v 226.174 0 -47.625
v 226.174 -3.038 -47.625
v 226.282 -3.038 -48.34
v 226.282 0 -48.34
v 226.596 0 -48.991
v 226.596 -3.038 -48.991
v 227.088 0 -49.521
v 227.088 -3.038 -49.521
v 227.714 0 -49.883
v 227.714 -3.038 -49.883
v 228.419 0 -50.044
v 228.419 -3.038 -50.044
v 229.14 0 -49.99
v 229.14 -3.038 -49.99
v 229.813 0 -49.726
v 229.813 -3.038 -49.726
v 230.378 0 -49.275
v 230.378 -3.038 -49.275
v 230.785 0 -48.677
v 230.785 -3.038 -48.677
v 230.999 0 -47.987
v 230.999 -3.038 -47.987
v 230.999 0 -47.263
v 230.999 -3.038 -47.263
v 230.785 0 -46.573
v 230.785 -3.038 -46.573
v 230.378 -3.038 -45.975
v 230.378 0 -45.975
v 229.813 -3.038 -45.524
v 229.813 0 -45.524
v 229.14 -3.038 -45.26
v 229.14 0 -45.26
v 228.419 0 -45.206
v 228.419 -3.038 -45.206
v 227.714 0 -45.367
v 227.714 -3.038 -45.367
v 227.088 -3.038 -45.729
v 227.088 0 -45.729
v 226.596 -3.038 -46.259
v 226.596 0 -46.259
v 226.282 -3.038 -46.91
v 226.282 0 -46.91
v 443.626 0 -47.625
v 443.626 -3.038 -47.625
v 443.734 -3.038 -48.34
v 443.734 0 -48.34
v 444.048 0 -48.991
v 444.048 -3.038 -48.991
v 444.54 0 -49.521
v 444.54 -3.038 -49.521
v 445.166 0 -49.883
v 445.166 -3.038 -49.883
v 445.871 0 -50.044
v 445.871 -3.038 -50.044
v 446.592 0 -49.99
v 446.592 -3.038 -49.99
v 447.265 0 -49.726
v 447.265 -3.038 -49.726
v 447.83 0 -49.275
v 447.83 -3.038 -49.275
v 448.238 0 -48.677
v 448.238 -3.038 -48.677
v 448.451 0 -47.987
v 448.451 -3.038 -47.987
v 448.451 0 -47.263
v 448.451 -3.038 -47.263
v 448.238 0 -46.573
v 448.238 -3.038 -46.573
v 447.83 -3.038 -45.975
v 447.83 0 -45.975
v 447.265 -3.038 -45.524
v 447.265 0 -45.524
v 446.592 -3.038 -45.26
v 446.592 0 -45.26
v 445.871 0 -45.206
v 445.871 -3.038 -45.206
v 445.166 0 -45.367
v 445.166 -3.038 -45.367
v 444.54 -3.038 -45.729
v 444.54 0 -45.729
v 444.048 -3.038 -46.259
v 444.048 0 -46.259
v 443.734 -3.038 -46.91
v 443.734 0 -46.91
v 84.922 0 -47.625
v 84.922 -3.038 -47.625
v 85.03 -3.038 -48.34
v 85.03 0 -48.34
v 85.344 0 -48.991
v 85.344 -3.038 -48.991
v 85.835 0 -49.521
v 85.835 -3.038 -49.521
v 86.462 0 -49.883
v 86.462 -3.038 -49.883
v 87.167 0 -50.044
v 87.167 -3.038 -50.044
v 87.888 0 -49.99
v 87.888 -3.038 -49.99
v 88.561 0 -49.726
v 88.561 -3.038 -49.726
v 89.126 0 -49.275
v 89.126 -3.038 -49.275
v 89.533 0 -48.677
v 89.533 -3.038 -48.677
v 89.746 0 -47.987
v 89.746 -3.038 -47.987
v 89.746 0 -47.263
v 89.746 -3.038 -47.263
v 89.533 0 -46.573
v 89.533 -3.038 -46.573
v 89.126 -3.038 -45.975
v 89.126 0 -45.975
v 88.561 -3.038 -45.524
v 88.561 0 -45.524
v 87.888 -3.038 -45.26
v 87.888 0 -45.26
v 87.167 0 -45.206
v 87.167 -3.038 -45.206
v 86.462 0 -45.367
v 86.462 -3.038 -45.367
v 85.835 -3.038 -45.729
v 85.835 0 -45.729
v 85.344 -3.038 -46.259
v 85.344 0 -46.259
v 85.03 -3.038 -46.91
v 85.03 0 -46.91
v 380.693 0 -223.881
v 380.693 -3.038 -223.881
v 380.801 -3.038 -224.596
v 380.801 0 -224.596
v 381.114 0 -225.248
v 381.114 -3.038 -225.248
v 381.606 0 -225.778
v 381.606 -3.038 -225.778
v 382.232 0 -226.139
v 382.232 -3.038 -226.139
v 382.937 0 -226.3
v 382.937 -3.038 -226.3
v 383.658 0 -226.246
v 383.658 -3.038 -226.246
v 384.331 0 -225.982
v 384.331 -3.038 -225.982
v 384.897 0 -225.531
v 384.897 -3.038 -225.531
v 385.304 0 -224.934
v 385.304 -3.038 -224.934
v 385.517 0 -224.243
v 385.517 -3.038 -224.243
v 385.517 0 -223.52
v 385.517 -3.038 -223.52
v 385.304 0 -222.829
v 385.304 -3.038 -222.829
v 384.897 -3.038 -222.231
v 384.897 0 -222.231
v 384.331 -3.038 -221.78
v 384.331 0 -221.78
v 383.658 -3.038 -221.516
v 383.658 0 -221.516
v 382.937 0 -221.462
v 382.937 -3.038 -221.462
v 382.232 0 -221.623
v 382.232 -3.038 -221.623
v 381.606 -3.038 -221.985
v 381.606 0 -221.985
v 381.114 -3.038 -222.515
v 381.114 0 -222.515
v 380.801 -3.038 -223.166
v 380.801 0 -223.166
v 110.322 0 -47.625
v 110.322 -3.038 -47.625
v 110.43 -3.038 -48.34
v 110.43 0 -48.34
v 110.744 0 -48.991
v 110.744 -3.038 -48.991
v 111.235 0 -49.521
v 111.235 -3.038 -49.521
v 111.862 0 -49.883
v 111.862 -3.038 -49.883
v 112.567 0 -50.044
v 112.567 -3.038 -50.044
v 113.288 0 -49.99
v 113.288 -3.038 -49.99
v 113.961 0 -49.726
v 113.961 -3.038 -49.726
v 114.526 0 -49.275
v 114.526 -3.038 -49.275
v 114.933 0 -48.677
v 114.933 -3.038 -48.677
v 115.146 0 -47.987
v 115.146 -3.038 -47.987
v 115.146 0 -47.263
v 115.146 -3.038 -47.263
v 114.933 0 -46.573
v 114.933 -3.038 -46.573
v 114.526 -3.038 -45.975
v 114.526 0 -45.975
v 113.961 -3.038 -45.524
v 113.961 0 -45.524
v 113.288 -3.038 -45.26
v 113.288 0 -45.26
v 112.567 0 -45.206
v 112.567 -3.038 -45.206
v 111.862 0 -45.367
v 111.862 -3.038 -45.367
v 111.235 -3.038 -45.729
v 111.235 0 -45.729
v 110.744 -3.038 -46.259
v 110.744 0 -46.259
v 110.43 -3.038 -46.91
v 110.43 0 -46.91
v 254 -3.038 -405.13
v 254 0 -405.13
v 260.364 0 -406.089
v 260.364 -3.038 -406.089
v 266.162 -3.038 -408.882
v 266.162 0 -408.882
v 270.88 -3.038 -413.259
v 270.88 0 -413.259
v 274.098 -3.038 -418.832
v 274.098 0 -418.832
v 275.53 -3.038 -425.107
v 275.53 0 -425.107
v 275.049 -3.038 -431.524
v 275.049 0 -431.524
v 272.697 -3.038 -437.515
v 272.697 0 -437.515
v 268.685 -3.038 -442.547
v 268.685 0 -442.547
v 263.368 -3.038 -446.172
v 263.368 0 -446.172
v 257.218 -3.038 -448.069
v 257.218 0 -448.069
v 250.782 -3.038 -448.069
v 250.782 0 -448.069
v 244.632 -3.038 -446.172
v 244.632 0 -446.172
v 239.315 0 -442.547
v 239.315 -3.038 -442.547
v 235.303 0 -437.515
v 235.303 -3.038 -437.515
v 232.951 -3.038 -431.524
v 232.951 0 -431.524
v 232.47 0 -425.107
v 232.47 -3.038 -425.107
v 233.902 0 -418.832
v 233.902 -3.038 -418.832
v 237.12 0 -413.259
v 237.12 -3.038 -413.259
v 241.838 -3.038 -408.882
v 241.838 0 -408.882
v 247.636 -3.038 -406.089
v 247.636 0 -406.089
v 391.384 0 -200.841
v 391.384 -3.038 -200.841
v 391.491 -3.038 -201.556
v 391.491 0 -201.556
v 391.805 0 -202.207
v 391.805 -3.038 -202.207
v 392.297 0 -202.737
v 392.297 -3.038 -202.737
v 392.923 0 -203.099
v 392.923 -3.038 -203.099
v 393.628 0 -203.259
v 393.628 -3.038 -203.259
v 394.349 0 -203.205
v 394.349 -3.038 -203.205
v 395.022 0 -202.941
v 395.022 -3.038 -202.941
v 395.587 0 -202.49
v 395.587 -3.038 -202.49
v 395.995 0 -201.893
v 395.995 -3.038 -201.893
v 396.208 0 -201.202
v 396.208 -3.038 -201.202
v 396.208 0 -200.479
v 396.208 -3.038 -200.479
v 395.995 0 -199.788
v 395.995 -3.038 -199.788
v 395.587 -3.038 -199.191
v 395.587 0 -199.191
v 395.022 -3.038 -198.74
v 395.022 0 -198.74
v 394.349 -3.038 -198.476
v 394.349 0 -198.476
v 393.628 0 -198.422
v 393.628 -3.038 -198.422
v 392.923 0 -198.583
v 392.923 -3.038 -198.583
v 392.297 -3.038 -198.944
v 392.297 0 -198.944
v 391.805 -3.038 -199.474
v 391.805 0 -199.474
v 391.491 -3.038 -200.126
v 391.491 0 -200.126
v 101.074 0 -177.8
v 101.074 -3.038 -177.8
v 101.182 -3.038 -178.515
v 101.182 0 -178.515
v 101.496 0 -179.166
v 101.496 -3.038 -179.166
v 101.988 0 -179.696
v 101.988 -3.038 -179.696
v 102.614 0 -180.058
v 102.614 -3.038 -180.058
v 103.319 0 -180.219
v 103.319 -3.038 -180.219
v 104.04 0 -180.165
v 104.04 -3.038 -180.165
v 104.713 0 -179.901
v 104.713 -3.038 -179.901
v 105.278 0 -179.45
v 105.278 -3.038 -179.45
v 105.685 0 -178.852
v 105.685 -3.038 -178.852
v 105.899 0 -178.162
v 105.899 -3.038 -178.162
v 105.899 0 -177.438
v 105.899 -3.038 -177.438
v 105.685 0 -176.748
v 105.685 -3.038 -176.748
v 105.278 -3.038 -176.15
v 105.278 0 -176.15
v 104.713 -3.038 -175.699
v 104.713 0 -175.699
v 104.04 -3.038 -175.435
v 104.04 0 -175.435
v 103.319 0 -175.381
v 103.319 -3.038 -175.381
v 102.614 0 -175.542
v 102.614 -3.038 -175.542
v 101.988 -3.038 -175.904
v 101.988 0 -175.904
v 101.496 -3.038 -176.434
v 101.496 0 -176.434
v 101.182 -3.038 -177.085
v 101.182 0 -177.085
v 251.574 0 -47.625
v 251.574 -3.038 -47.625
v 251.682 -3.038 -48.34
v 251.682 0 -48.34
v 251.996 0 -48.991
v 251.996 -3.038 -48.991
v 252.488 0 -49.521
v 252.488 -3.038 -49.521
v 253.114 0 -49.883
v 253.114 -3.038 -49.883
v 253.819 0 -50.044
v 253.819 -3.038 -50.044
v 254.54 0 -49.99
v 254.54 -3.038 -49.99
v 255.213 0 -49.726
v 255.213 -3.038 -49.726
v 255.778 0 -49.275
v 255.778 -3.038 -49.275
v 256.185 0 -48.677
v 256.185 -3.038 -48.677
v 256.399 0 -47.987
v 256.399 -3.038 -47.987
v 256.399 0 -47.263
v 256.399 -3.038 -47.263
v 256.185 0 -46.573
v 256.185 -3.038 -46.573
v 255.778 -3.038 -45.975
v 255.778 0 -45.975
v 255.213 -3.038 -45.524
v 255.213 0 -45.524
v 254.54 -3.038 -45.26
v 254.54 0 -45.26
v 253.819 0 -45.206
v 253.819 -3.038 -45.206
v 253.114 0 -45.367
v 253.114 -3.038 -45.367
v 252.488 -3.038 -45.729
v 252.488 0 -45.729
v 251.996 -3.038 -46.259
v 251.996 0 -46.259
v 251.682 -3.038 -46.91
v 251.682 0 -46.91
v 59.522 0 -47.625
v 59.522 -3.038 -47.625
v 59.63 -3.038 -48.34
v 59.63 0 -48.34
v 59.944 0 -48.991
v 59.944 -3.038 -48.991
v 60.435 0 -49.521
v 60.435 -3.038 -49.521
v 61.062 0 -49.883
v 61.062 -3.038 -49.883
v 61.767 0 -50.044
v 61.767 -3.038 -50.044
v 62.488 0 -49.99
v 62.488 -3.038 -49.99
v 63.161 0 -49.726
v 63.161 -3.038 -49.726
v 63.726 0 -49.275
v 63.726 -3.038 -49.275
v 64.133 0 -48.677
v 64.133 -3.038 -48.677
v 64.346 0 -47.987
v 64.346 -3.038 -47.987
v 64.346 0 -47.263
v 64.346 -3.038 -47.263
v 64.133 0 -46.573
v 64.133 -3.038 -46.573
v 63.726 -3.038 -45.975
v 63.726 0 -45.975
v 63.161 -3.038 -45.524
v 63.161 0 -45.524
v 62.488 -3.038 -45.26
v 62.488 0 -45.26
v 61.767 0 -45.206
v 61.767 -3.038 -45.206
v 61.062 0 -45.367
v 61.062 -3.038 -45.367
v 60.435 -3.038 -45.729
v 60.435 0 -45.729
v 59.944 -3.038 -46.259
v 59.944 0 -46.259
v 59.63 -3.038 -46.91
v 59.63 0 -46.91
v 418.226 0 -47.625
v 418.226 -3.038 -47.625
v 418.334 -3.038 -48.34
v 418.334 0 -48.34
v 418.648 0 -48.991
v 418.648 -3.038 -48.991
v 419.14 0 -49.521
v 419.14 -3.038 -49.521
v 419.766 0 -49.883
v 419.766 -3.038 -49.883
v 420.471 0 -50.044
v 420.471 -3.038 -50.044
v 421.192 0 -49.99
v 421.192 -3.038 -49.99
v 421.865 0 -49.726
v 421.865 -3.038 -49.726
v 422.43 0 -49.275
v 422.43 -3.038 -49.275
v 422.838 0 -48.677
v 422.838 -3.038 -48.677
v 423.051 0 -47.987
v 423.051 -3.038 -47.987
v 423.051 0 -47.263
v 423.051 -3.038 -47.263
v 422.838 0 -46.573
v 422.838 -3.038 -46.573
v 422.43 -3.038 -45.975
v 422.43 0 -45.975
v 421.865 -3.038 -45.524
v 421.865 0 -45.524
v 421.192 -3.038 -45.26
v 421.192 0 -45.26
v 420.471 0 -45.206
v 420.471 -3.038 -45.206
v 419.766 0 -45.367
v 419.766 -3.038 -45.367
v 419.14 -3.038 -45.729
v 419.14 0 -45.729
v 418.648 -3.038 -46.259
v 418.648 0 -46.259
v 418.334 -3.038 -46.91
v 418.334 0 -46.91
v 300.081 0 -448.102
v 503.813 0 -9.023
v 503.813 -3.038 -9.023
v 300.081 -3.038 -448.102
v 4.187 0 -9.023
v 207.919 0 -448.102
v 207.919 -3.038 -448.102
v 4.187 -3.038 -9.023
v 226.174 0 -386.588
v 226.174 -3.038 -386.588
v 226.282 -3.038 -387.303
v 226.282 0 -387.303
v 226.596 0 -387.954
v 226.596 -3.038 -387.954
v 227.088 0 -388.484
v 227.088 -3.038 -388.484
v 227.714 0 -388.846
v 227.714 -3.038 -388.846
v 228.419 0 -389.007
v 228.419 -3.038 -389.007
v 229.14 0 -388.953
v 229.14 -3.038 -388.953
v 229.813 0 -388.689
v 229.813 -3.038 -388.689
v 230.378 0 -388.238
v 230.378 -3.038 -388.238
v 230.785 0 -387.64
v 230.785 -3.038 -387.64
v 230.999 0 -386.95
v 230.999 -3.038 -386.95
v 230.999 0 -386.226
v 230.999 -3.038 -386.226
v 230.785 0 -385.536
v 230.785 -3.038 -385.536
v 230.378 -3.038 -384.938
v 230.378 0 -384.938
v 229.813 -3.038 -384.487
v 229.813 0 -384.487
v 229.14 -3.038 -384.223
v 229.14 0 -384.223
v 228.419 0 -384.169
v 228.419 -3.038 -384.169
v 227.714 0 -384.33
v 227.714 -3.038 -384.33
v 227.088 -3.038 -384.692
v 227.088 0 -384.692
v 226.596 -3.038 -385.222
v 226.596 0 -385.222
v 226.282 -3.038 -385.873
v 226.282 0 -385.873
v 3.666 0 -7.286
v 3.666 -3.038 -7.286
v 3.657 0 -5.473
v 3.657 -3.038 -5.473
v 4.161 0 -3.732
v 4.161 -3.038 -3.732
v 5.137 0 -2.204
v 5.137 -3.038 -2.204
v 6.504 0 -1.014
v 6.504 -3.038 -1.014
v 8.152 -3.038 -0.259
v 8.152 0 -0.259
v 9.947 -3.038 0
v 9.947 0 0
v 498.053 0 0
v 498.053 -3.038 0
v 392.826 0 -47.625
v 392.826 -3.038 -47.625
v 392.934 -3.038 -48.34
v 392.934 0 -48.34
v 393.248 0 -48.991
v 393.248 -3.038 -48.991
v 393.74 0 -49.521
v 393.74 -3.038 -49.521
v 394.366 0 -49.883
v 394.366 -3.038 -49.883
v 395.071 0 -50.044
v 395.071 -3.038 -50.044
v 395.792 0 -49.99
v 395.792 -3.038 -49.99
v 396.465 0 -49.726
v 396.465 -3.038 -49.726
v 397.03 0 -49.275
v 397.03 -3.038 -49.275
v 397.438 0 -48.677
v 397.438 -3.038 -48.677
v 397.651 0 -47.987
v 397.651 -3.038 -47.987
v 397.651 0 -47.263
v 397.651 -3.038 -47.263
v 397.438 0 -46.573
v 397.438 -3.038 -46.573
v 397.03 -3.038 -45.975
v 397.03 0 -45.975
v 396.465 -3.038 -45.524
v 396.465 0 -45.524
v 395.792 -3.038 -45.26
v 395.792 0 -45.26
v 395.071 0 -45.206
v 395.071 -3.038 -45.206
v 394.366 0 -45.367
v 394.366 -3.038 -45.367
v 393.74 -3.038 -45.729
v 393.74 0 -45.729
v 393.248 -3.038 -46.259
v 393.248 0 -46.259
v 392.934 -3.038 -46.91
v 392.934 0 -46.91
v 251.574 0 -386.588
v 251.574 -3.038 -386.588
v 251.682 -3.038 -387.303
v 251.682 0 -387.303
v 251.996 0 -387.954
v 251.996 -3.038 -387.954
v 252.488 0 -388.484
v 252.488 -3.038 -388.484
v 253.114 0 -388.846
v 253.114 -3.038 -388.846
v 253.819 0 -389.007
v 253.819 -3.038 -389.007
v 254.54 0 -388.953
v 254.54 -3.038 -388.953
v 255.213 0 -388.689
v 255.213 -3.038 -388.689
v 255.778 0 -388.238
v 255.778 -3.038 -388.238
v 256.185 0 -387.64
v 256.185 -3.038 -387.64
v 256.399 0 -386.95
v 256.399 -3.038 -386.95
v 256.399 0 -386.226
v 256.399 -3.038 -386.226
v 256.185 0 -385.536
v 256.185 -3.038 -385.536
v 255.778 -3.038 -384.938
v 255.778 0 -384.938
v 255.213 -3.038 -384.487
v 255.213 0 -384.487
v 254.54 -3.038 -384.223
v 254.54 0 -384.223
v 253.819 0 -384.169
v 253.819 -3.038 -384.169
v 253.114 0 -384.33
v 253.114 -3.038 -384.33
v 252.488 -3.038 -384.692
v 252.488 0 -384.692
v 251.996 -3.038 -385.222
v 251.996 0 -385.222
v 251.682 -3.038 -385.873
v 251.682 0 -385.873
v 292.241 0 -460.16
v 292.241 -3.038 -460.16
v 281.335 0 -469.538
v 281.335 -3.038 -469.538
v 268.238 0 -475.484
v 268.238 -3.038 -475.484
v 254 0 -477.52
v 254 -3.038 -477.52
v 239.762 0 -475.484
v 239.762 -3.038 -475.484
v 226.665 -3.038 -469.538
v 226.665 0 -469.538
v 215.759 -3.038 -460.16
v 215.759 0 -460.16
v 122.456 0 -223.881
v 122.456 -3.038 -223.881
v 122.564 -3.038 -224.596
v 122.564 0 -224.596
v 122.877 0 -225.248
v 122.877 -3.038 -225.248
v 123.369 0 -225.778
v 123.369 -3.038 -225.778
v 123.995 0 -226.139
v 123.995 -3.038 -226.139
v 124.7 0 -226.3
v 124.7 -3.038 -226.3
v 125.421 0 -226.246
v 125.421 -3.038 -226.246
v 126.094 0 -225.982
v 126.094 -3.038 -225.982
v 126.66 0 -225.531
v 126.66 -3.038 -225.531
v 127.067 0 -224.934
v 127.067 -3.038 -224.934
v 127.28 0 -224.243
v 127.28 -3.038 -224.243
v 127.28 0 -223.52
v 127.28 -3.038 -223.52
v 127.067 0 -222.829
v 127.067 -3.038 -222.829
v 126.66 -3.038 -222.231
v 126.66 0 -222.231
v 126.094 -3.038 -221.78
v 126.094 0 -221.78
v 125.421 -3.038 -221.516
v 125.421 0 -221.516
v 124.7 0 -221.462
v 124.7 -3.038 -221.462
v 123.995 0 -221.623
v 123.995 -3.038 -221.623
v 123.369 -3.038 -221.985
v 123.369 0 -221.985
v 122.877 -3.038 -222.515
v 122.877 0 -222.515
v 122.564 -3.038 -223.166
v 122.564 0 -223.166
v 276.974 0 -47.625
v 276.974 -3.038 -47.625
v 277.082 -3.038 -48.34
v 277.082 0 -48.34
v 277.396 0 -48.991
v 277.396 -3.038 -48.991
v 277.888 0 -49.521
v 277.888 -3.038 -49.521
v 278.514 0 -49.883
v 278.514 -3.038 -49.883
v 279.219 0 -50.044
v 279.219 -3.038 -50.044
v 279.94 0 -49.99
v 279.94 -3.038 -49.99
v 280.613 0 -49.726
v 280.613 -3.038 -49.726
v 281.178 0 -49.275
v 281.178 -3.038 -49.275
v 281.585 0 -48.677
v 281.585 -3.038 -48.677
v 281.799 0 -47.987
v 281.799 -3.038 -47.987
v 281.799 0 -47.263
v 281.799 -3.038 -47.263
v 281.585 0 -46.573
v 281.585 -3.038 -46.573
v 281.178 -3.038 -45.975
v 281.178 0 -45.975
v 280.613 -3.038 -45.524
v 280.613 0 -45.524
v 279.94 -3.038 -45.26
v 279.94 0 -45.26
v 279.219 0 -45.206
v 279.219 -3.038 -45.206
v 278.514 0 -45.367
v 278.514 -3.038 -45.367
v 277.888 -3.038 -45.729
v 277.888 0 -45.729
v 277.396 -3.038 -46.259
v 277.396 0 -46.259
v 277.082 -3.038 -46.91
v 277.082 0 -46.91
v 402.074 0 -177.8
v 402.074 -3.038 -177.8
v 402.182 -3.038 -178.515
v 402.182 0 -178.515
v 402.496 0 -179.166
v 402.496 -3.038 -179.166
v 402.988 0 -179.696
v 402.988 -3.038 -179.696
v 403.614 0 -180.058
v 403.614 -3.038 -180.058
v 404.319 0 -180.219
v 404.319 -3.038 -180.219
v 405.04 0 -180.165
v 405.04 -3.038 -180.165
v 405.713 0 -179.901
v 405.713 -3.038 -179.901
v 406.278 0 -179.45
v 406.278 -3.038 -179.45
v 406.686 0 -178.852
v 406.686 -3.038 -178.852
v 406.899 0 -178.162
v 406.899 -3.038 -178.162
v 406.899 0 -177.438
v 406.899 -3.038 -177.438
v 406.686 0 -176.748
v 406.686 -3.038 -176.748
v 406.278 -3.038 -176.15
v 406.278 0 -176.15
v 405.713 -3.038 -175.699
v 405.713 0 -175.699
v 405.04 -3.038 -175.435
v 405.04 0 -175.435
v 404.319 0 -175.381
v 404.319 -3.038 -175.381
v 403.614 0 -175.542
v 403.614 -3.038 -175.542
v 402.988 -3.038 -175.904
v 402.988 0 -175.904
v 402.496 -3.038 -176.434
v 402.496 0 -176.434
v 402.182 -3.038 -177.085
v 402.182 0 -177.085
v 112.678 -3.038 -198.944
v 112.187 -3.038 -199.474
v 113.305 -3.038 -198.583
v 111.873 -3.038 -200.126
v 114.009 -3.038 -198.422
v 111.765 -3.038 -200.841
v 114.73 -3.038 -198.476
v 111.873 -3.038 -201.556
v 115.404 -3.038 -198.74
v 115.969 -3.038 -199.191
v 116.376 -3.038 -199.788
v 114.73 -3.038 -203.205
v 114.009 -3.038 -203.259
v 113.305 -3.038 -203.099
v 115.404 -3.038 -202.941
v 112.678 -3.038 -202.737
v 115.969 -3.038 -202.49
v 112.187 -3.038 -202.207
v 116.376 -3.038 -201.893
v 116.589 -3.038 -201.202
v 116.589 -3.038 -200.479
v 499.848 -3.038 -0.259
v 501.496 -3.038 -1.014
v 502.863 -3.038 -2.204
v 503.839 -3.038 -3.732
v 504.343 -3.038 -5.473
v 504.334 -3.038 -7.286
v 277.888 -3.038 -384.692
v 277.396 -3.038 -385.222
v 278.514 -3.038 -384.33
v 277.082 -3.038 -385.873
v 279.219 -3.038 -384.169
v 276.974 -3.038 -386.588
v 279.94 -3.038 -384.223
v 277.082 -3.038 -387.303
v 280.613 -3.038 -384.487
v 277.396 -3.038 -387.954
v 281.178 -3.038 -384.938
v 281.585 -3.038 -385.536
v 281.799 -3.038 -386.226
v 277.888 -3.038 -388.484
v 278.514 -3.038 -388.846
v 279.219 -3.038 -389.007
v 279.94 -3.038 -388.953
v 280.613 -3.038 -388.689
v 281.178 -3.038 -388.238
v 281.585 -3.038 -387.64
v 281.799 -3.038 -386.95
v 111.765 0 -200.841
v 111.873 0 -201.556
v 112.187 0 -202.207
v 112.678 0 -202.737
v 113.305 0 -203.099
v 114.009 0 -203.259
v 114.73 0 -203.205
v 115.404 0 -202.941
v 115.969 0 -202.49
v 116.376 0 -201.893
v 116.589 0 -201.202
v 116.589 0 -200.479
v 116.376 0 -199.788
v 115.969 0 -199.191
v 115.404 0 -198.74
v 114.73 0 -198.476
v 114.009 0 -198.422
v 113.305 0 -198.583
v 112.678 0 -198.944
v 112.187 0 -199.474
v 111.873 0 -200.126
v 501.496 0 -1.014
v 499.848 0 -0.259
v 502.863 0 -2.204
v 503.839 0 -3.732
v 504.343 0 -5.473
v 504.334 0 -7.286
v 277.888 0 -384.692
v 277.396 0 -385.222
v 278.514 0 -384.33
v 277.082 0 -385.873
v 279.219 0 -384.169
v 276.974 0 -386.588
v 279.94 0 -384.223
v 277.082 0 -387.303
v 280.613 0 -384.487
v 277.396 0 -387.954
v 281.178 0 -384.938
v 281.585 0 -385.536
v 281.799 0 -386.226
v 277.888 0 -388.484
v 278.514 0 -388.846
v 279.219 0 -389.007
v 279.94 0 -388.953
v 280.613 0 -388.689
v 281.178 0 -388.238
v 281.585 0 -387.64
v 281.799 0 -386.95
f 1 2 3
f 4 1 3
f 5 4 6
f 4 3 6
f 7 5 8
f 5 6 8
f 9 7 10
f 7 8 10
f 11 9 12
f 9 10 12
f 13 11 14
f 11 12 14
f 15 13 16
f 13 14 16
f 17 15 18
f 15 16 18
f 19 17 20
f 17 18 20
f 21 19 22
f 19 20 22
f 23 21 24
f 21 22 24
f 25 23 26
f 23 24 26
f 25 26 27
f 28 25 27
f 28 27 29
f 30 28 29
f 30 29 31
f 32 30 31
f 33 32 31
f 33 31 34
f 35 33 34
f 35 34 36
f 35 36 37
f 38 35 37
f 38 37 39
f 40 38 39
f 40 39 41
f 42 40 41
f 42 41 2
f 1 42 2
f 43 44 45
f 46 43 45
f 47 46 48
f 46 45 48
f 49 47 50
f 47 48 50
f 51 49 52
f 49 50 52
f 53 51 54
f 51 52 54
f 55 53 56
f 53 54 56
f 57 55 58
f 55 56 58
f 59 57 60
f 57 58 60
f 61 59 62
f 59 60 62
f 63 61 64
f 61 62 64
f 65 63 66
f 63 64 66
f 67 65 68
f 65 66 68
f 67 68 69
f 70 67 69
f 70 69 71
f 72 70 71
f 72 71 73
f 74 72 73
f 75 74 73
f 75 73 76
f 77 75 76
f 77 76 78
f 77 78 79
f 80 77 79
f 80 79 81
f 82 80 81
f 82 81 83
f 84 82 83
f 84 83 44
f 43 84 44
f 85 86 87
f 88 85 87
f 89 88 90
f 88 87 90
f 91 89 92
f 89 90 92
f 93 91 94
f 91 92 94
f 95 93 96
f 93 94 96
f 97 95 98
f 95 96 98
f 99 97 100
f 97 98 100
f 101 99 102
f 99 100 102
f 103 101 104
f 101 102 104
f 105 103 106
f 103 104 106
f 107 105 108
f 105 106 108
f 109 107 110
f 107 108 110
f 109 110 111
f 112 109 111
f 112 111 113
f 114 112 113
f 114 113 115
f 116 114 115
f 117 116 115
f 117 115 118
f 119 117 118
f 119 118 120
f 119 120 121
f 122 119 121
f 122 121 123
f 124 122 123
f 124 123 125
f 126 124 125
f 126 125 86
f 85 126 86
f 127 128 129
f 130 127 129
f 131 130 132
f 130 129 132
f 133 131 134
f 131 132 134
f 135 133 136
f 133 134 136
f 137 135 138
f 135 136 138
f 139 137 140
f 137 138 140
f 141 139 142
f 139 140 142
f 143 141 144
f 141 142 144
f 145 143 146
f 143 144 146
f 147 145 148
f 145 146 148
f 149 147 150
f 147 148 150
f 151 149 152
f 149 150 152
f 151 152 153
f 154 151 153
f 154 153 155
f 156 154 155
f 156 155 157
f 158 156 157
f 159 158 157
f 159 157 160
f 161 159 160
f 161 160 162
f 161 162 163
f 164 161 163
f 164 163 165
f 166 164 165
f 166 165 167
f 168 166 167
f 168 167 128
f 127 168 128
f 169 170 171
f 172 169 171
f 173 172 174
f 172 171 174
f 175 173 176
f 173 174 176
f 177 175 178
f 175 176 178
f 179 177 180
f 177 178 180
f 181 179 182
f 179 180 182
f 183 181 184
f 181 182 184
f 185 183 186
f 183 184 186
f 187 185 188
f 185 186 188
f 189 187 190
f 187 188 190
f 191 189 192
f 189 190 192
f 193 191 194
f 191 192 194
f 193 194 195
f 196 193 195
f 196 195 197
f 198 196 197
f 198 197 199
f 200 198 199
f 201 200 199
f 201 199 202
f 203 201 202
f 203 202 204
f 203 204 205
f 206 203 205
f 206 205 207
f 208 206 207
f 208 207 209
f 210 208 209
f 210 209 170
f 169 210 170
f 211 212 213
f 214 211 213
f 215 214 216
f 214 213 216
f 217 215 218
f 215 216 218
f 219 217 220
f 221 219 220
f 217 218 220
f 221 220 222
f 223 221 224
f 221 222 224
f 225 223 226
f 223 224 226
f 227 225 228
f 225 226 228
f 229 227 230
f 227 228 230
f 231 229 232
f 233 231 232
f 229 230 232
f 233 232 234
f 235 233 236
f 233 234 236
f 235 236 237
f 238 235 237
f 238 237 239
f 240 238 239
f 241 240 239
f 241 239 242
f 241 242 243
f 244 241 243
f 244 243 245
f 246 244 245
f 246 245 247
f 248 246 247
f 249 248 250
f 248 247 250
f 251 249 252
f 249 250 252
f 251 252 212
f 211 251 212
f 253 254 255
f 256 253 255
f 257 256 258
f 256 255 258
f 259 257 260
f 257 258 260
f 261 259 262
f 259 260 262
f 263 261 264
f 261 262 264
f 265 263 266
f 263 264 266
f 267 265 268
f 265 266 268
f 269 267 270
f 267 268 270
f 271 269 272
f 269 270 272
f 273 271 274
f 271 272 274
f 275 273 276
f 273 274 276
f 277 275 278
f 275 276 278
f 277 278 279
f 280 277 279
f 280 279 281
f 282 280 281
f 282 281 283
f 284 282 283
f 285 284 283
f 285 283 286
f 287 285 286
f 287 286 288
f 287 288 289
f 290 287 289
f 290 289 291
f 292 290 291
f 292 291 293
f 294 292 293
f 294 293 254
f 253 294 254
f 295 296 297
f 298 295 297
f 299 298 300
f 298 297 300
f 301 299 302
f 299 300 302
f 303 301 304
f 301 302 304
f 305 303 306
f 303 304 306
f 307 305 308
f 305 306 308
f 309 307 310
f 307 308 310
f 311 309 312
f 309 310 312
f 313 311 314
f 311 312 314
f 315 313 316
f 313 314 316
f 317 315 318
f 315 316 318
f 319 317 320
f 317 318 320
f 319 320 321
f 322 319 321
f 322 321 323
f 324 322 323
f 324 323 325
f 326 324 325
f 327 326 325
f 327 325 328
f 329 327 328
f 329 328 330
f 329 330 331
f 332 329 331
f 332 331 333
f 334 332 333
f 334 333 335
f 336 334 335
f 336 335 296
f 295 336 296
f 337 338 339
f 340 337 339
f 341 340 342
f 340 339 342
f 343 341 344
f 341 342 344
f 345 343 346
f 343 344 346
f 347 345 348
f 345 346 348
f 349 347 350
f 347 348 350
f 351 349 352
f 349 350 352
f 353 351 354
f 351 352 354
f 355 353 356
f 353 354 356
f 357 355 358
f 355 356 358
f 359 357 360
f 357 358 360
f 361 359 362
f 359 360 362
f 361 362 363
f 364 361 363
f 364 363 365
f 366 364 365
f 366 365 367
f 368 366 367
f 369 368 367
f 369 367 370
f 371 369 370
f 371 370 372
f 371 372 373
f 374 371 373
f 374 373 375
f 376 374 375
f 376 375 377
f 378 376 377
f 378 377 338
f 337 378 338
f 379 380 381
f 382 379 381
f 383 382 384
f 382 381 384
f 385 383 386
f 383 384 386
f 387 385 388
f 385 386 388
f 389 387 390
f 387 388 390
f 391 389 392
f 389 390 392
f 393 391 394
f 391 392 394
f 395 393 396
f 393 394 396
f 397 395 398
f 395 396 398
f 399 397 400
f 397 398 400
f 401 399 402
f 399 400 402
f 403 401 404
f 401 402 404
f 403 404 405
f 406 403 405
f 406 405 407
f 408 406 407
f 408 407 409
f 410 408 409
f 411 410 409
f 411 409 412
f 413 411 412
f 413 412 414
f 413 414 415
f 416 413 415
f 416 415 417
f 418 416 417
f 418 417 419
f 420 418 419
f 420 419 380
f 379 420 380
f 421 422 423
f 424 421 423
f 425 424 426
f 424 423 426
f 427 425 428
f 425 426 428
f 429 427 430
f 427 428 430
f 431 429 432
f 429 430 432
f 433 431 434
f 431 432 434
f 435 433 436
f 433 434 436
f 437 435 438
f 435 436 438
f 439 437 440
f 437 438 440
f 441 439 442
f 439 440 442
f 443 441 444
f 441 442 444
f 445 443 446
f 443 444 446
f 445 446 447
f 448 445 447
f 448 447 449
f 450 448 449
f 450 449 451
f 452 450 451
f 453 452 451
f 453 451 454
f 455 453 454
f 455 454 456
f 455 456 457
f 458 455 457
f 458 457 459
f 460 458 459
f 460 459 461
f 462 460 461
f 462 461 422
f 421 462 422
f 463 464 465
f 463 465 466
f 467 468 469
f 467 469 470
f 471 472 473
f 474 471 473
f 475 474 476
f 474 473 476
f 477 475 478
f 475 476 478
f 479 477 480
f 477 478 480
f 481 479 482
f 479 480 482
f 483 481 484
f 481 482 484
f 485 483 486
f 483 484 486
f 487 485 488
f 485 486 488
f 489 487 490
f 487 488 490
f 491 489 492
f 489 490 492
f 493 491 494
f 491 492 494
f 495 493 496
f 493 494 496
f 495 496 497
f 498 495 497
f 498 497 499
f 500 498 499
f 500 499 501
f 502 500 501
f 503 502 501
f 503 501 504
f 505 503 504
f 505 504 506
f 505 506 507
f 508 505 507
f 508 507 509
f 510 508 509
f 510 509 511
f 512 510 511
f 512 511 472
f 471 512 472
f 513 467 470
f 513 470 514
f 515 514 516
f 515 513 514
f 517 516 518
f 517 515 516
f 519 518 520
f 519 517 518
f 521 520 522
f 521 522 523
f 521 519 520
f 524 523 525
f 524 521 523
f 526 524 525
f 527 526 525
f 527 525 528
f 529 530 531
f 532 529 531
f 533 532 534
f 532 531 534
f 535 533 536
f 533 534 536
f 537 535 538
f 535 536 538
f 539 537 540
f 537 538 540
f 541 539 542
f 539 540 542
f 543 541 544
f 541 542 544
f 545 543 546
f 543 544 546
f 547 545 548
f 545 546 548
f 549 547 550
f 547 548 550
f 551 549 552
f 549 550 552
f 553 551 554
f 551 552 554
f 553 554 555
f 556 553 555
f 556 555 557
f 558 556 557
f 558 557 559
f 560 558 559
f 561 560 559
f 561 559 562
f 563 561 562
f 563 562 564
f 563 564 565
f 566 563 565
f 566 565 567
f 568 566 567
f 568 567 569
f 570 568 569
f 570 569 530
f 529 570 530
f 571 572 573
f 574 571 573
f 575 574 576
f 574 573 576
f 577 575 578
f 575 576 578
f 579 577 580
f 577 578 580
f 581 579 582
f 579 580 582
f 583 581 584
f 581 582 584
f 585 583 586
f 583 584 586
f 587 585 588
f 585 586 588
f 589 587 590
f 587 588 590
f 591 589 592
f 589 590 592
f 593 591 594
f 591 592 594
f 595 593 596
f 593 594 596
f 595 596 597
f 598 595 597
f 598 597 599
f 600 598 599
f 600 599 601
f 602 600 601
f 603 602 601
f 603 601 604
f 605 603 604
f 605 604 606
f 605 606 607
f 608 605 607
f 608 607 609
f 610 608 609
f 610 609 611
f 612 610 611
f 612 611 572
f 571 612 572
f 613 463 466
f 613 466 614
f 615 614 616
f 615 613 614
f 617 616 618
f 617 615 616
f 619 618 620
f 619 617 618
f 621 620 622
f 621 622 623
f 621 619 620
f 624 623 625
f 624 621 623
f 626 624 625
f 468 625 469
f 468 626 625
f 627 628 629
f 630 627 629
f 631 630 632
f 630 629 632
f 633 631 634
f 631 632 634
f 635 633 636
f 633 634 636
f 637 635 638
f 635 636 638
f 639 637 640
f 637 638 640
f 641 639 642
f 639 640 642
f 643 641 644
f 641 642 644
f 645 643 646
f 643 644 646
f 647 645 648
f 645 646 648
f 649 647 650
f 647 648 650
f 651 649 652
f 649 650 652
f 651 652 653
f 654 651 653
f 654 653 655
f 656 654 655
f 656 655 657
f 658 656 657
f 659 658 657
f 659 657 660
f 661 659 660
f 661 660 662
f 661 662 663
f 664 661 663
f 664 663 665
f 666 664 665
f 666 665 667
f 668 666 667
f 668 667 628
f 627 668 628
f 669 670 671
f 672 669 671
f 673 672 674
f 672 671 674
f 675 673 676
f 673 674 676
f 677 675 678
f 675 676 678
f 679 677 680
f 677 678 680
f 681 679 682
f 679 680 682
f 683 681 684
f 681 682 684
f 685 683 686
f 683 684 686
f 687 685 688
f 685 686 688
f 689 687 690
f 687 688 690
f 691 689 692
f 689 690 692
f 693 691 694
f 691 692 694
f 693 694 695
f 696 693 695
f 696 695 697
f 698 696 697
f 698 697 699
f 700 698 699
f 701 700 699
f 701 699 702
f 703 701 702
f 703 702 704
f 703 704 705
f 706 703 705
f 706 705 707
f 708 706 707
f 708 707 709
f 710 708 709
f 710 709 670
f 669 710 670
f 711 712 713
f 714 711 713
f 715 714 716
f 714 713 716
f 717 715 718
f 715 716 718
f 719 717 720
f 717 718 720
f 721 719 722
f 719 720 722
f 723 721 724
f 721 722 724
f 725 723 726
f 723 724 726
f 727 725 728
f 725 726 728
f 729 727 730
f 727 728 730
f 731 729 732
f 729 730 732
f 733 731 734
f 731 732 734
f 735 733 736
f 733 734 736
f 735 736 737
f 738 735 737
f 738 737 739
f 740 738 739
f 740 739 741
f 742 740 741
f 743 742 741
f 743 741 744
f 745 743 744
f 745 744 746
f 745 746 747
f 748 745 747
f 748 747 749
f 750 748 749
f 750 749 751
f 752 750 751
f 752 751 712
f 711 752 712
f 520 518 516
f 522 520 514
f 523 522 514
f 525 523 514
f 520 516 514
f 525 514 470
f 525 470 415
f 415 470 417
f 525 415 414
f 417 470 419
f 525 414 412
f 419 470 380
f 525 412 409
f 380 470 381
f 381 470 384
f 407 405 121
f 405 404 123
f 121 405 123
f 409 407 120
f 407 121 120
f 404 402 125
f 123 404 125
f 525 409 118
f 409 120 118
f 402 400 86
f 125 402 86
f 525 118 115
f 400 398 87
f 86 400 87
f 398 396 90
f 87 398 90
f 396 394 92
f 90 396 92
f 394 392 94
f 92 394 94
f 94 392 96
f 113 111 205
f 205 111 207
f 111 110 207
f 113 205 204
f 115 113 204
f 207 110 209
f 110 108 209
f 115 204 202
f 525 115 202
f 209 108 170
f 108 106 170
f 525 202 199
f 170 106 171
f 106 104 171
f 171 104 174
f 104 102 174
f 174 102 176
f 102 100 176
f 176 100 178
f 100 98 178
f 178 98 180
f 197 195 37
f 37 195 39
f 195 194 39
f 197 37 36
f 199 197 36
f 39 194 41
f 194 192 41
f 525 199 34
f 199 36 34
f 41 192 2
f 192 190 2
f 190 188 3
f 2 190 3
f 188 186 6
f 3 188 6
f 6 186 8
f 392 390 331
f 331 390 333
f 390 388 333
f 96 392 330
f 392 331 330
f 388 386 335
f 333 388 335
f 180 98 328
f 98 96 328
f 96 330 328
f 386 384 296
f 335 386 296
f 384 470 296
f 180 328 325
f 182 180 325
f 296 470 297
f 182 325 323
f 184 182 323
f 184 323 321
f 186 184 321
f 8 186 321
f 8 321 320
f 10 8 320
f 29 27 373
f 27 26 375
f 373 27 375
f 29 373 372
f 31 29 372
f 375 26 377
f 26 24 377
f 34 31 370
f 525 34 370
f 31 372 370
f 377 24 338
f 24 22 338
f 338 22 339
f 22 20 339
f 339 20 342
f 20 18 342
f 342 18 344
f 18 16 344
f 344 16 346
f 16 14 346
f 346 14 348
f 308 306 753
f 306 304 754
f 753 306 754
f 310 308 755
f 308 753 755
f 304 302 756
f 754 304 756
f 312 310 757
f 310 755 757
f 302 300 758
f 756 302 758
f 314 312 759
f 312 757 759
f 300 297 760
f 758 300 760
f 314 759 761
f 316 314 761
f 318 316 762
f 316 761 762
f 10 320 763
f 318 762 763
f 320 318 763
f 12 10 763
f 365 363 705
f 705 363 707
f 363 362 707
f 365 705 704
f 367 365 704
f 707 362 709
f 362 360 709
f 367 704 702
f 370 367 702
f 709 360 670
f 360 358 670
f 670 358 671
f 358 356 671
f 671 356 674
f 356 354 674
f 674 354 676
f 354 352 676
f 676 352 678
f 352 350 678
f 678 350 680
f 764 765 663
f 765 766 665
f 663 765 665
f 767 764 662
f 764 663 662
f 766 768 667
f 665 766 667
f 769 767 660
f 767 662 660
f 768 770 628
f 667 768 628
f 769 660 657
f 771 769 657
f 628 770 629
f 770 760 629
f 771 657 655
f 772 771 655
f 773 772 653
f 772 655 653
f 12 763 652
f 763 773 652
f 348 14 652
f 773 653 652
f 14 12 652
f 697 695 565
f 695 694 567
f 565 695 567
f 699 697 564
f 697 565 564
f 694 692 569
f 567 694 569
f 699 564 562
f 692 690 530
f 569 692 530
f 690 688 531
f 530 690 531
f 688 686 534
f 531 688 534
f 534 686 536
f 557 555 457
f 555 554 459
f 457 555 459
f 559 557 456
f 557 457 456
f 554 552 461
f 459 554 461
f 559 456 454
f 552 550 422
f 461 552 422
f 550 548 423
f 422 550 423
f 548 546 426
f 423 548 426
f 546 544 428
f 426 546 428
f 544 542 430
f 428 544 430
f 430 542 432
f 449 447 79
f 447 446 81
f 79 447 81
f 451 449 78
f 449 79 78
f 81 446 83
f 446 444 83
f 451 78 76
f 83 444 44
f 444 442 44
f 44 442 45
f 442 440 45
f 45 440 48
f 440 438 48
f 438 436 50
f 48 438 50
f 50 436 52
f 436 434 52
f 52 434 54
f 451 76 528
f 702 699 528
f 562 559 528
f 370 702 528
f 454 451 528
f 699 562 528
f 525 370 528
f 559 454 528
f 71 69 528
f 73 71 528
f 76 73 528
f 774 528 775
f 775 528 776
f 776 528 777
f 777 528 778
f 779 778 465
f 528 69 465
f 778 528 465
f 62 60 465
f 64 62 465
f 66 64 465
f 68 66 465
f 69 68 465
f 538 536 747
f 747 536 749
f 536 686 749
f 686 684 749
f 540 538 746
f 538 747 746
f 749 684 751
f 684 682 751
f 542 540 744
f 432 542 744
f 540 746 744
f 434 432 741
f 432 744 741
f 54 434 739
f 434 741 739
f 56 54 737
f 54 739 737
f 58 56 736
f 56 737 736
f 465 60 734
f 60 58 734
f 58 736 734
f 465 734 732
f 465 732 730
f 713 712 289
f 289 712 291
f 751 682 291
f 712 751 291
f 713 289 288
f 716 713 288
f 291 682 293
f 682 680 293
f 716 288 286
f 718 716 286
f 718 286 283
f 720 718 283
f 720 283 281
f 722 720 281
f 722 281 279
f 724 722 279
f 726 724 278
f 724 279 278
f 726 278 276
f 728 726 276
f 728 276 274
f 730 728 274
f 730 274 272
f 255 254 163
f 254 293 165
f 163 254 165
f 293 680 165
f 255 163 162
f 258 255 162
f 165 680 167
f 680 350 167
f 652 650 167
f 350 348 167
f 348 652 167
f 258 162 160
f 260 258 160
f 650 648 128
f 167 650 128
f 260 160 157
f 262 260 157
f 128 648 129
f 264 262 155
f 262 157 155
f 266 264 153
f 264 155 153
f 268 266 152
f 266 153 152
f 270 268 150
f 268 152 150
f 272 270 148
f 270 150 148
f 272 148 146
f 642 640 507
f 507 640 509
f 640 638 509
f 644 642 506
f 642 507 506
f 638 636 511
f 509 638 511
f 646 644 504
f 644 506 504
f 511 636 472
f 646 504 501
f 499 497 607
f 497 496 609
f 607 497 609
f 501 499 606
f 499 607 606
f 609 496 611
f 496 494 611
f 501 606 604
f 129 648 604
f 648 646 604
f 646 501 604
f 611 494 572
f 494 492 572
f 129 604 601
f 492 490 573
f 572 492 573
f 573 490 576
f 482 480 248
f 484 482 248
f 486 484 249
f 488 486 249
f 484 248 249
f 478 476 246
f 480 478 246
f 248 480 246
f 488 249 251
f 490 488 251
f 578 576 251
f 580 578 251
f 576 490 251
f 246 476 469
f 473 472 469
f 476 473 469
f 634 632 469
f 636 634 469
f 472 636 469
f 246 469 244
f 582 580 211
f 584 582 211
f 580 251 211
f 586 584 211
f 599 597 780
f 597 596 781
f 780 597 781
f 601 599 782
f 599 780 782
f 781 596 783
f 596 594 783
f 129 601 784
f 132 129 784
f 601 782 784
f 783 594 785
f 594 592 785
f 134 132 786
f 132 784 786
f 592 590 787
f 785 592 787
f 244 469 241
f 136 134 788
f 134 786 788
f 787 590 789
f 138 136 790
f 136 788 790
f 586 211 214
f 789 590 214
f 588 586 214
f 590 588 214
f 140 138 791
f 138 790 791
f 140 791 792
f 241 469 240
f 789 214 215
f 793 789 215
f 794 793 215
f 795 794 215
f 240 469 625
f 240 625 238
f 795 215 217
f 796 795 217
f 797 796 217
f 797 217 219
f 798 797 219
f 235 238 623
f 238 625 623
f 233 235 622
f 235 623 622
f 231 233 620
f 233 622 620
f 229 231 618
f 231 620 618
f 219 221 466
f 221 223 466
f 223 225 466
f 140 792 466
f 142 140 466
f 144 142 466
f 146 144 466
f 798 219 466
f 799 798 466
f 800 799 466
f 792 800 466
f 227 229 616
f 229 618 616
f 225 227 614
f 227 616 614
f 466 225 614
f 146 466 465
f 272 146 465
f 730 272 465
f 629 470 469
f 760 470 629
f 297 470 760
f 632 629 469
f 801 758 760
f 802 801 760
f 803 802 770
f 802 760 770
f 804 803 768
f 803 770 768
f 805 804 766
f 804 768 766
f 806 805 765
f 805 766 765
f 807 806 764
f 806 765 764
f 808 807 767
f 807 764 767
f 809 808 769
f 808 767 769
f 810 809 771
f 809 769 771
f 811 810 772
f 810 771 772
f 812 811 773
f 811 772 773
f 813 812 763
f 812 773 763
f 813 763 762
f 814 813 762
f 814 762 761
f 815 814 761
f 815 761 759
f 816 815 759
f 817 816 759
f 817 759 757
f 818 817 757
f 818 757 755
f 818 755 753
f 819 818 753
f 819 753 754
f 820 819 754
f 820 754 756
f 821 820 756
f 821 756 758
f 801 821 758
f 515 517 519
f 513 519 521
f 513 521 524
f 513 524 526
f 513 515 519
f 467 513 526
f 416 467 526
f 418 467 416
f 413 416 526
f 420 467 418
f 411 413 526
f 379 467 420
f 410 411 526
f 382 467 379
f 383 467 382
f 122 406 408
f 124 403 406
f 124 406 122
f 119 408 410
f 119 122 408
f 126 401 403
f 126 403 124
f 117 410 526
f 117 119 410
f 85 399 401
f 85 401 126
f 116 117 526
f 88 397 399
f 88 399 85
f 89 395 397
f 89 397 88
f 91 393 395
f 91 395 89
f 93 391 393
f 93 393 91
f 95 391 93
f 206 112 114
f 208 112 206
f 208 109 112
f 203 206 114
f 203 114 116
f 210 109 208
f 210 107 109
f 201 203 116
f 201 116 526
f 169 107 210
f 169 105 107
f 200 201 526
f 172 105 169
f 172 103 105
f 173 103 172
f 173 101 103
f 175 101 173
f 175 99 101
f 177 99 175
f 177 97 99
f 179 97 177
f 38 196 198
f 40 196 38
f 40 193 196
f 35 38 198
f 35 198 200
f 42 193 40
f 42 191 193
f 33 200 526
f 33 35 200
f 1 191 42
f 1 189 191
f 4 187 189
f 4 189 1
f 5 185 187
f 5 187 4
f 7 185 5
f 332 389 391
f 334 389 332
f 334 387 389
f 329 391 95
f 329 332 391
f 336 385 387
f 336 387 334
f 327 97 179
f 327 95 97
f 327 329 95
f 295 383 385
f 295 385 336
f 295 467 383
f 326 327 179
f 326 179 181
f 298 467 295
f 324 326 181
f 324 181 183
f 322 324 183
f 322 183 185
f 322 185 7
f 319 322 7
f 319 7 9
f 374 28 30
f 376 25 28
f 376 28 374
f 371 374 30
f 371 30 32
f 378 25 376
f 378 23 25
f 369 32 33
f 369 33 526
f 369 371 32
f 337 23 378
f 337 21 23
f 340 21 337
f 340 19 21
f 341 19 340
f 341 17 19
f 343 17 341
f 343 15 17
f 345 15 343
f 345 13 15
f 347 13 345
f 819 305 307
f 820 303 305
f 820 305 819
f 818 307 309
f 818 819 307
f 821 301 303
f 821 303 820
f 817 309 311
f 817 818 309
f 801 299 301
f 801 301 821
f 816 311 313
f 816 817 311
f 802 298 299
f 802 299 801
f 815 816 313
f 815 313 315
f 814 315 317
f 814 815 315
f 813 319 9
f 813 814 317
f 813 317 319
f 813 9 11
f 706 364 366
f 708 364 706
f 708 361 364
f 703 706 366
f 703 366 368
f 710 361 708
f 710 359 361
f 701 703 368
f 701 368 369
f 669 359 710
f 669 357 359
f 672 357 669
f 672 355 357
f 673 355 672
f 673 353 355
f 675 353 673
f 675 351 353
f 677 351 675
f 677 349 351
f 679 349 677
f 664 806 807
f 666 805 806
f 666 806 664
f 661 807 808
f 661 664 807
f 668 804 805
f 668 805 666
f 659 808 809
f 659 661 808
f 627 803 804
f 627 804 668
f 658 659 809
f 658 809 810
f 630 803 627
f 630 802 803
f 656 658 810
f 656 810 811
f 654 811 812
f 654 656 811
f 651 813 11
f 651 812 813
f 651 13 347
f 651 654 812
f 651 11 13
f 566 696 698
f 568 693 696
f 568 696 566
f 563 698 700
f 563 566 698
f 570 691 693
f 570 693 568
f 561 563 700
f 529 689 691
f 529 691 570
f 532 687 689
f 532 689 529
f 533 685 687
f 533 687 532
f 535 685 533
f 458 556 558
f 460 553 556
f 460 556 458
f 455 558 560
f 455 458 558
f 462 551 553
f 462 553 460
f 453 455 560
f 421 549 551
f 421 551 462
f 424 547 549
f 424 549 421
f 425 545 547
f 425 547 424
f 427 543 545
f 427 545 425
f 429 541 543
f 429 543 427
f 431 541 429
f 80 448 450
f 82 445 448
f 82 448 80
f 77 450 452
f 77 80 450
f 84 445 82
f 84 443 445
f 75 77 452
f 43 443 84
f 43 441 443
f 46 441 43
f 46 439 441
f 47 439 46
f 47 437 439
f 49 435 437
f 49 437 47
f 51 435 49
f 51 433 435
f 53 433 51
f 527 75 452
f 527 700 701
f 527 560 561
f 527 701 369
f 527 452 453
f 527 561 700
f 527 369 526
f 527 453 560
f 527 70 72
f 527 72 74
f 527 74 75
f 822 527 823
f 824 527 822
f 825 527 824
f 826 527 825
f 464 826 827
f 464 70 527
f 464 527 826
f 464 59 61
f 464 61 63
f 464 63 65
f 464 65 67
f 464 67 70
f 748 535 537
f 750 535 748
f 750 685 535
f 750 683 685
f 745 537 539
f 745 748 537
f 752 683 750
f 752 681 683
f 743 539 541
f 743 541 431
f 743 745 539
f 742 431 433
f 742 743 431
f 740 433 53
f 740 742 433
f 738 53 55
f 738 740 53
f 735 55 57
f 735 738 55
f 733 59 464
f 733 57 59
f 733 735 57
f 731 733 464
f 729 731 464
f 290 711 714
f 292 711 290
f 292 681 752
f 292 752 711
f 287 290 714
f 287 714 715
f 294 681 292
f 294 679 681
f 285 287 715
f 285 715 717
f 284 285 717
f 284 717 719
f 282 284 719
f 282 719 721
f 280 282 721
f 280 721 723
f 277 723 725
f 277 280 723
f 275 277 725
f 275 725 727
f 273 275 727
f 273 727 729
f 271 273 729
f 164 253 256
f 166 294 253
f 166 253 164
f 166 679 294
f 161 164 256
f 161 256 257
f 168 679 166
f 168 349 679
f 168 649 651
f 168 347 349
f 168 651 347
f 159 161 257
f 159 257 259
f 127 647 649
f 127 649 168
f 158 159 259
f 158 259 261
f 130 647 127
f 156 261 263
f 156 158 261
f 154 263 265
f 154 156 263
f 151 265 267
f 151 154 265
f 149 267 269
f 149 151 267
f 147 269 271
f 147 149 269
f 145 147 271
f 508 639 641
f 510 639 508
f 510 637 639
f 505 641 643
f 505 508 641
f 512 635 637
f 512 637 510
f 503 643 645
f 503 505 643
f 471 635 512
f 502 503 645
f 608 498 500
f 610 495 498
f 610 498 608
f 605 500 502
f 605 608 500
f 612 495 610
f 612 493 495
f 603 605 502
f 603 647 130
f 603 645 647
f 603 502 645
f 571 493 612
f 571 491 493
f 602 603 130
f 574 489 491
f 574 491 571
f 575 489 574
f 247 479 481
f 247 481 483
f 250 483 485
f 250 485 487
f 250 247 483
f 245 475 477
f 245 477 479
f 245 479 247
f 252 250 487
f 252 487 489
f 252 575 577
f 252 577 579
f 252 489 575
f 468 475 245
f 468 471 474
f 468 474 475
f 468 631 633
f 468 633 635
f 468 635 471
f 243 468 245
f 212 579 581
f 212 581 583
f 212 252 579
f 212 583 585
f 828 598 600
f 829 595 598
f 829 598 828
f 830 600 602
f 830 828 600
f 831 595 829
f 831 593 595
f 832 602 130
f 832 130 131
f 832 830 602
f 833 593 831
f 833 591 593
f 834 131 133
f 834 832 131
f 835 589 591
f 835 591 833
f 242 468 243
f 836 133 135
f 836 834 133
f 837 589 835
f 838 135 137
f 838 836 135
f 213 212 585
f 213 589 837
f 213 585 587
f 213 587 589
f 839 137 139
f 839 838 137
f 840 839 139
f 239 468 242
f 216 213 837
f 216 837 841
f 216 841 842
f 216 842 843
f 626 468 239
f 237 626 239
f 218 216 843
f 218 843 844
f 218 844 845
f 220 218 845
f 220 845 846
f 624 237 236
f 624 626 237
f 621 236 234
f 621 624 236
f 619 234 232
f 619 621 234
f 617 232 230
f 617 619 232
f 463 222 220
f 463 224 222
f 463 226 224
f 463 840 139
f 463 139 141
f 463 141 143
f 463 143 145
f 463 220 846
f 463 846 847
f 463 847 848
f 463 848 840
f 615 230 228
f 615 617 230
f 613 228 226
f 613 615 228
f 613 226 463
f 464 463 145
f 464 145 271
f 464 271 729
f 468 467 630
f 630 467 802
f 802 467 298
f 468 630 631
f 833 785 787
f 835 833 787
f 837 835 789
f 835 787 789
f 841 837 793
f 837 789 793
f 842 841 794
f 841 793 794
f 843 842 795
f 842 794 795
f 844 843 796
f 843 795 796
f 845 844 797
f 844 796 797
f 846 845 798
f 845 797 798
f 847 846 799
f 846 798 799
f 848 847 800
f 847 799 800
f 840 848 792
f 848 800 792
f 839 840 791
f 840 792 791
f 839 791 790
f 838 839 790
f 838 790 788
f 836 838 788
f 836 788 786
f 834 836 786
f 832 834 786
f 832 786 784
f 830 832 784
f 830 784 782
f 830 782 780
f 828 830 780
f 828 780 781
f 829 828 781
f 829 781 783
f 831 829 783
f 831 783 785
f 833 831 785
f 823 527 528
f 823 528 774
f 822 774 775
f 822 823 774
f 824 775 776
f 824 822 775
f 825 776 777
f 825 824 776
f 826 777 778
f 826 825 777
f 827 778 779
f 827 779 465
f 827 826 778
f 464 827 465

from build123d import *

# Parameters (mm, degrees)
SKETCH1_R                   = 21.59
BASE_FLANGE1_DEPTH          = 3.03784
F_11_0_191_DIAMETER_HOLE1_D = 4.8514
F_11_0_191_DIAMETER_HOLE2_D = 4.8514


# Sheet-metal steps are written as plain solids
with BuildPart() as part:
    # Sketch1 → Base-Flange1 (new body)
    with BuildSketch(Plane(origin=(0, 0, 0), x_dir=(1, 0, 0), z_dir=(0, 1, 0))):
        with BuildLine():
            Line((9.946664741, 0), (498.053335259, 0))
            ThreePointArc((498.053335259, 0), (503.405631357, 2.933067681), (503.813471801, 9.022700323))
            Line((503.813471801, 9.022700323), (300.081092338, 448.101602582))
            ThreePointArc((300.081092338, 448.101602582), (254, 477.52), (207.918907662, 448.101602582))
            Line((207.918907662, 448.101602582), (4.186528199, 9.022700323))
            ThreePointArc((4.186528199, 9.022700323), (4.594368643, 2.933067681), (9.946664741, 0))
        make_face()
        with Locations(Location((254, 426.72, 0), (0, 0, 270))):
            Circle(SKETCH1_R, mode=Mode.SUBTRACT)
    extrude(amount=-BASE_FLANGE1_DEPTH)

    # #11 (0.191) Diameter Hole1 (through all)
    with Locations(Plane(origin=(0, 0, 0), x_dir=(1, 0, 0), z_dir=(0, 1, 0))):
        with Locations((61.947885367, 47.625), (87.347885367, 47.625), (112.747885367, 47.625), (228.6, 47.625), (254, 47.625), (446.052114633, 47.625), (420.652114633, 47.625), (395.252114633, 47.625), (279.4, 47.625), (103.499910638, 177.8), (114.190711929, 200.840546169), (124.88151322, 223.881092338), (404.500089362, 177.8), (393.809288071, 200.840546169), (383.11848678, 223.881092338)):
            Hole(F_11_0_191_DIAMETER_HOLE1_D / 2)

    # #11 (0.191) Diameter Hole2 (through all)
    with Locations(Plane(origin=(0, 0, 0), x_dir=(1, 0, 0), z_dir=(0, 1, 0))):
        with Locations((228.6, 386.588000012), (254, 386.588000012), (279.4, 386.588000012)):
            Hole(F_11_0_191_DIAMETER_HOLE2_D / 2)


solid = part.part
